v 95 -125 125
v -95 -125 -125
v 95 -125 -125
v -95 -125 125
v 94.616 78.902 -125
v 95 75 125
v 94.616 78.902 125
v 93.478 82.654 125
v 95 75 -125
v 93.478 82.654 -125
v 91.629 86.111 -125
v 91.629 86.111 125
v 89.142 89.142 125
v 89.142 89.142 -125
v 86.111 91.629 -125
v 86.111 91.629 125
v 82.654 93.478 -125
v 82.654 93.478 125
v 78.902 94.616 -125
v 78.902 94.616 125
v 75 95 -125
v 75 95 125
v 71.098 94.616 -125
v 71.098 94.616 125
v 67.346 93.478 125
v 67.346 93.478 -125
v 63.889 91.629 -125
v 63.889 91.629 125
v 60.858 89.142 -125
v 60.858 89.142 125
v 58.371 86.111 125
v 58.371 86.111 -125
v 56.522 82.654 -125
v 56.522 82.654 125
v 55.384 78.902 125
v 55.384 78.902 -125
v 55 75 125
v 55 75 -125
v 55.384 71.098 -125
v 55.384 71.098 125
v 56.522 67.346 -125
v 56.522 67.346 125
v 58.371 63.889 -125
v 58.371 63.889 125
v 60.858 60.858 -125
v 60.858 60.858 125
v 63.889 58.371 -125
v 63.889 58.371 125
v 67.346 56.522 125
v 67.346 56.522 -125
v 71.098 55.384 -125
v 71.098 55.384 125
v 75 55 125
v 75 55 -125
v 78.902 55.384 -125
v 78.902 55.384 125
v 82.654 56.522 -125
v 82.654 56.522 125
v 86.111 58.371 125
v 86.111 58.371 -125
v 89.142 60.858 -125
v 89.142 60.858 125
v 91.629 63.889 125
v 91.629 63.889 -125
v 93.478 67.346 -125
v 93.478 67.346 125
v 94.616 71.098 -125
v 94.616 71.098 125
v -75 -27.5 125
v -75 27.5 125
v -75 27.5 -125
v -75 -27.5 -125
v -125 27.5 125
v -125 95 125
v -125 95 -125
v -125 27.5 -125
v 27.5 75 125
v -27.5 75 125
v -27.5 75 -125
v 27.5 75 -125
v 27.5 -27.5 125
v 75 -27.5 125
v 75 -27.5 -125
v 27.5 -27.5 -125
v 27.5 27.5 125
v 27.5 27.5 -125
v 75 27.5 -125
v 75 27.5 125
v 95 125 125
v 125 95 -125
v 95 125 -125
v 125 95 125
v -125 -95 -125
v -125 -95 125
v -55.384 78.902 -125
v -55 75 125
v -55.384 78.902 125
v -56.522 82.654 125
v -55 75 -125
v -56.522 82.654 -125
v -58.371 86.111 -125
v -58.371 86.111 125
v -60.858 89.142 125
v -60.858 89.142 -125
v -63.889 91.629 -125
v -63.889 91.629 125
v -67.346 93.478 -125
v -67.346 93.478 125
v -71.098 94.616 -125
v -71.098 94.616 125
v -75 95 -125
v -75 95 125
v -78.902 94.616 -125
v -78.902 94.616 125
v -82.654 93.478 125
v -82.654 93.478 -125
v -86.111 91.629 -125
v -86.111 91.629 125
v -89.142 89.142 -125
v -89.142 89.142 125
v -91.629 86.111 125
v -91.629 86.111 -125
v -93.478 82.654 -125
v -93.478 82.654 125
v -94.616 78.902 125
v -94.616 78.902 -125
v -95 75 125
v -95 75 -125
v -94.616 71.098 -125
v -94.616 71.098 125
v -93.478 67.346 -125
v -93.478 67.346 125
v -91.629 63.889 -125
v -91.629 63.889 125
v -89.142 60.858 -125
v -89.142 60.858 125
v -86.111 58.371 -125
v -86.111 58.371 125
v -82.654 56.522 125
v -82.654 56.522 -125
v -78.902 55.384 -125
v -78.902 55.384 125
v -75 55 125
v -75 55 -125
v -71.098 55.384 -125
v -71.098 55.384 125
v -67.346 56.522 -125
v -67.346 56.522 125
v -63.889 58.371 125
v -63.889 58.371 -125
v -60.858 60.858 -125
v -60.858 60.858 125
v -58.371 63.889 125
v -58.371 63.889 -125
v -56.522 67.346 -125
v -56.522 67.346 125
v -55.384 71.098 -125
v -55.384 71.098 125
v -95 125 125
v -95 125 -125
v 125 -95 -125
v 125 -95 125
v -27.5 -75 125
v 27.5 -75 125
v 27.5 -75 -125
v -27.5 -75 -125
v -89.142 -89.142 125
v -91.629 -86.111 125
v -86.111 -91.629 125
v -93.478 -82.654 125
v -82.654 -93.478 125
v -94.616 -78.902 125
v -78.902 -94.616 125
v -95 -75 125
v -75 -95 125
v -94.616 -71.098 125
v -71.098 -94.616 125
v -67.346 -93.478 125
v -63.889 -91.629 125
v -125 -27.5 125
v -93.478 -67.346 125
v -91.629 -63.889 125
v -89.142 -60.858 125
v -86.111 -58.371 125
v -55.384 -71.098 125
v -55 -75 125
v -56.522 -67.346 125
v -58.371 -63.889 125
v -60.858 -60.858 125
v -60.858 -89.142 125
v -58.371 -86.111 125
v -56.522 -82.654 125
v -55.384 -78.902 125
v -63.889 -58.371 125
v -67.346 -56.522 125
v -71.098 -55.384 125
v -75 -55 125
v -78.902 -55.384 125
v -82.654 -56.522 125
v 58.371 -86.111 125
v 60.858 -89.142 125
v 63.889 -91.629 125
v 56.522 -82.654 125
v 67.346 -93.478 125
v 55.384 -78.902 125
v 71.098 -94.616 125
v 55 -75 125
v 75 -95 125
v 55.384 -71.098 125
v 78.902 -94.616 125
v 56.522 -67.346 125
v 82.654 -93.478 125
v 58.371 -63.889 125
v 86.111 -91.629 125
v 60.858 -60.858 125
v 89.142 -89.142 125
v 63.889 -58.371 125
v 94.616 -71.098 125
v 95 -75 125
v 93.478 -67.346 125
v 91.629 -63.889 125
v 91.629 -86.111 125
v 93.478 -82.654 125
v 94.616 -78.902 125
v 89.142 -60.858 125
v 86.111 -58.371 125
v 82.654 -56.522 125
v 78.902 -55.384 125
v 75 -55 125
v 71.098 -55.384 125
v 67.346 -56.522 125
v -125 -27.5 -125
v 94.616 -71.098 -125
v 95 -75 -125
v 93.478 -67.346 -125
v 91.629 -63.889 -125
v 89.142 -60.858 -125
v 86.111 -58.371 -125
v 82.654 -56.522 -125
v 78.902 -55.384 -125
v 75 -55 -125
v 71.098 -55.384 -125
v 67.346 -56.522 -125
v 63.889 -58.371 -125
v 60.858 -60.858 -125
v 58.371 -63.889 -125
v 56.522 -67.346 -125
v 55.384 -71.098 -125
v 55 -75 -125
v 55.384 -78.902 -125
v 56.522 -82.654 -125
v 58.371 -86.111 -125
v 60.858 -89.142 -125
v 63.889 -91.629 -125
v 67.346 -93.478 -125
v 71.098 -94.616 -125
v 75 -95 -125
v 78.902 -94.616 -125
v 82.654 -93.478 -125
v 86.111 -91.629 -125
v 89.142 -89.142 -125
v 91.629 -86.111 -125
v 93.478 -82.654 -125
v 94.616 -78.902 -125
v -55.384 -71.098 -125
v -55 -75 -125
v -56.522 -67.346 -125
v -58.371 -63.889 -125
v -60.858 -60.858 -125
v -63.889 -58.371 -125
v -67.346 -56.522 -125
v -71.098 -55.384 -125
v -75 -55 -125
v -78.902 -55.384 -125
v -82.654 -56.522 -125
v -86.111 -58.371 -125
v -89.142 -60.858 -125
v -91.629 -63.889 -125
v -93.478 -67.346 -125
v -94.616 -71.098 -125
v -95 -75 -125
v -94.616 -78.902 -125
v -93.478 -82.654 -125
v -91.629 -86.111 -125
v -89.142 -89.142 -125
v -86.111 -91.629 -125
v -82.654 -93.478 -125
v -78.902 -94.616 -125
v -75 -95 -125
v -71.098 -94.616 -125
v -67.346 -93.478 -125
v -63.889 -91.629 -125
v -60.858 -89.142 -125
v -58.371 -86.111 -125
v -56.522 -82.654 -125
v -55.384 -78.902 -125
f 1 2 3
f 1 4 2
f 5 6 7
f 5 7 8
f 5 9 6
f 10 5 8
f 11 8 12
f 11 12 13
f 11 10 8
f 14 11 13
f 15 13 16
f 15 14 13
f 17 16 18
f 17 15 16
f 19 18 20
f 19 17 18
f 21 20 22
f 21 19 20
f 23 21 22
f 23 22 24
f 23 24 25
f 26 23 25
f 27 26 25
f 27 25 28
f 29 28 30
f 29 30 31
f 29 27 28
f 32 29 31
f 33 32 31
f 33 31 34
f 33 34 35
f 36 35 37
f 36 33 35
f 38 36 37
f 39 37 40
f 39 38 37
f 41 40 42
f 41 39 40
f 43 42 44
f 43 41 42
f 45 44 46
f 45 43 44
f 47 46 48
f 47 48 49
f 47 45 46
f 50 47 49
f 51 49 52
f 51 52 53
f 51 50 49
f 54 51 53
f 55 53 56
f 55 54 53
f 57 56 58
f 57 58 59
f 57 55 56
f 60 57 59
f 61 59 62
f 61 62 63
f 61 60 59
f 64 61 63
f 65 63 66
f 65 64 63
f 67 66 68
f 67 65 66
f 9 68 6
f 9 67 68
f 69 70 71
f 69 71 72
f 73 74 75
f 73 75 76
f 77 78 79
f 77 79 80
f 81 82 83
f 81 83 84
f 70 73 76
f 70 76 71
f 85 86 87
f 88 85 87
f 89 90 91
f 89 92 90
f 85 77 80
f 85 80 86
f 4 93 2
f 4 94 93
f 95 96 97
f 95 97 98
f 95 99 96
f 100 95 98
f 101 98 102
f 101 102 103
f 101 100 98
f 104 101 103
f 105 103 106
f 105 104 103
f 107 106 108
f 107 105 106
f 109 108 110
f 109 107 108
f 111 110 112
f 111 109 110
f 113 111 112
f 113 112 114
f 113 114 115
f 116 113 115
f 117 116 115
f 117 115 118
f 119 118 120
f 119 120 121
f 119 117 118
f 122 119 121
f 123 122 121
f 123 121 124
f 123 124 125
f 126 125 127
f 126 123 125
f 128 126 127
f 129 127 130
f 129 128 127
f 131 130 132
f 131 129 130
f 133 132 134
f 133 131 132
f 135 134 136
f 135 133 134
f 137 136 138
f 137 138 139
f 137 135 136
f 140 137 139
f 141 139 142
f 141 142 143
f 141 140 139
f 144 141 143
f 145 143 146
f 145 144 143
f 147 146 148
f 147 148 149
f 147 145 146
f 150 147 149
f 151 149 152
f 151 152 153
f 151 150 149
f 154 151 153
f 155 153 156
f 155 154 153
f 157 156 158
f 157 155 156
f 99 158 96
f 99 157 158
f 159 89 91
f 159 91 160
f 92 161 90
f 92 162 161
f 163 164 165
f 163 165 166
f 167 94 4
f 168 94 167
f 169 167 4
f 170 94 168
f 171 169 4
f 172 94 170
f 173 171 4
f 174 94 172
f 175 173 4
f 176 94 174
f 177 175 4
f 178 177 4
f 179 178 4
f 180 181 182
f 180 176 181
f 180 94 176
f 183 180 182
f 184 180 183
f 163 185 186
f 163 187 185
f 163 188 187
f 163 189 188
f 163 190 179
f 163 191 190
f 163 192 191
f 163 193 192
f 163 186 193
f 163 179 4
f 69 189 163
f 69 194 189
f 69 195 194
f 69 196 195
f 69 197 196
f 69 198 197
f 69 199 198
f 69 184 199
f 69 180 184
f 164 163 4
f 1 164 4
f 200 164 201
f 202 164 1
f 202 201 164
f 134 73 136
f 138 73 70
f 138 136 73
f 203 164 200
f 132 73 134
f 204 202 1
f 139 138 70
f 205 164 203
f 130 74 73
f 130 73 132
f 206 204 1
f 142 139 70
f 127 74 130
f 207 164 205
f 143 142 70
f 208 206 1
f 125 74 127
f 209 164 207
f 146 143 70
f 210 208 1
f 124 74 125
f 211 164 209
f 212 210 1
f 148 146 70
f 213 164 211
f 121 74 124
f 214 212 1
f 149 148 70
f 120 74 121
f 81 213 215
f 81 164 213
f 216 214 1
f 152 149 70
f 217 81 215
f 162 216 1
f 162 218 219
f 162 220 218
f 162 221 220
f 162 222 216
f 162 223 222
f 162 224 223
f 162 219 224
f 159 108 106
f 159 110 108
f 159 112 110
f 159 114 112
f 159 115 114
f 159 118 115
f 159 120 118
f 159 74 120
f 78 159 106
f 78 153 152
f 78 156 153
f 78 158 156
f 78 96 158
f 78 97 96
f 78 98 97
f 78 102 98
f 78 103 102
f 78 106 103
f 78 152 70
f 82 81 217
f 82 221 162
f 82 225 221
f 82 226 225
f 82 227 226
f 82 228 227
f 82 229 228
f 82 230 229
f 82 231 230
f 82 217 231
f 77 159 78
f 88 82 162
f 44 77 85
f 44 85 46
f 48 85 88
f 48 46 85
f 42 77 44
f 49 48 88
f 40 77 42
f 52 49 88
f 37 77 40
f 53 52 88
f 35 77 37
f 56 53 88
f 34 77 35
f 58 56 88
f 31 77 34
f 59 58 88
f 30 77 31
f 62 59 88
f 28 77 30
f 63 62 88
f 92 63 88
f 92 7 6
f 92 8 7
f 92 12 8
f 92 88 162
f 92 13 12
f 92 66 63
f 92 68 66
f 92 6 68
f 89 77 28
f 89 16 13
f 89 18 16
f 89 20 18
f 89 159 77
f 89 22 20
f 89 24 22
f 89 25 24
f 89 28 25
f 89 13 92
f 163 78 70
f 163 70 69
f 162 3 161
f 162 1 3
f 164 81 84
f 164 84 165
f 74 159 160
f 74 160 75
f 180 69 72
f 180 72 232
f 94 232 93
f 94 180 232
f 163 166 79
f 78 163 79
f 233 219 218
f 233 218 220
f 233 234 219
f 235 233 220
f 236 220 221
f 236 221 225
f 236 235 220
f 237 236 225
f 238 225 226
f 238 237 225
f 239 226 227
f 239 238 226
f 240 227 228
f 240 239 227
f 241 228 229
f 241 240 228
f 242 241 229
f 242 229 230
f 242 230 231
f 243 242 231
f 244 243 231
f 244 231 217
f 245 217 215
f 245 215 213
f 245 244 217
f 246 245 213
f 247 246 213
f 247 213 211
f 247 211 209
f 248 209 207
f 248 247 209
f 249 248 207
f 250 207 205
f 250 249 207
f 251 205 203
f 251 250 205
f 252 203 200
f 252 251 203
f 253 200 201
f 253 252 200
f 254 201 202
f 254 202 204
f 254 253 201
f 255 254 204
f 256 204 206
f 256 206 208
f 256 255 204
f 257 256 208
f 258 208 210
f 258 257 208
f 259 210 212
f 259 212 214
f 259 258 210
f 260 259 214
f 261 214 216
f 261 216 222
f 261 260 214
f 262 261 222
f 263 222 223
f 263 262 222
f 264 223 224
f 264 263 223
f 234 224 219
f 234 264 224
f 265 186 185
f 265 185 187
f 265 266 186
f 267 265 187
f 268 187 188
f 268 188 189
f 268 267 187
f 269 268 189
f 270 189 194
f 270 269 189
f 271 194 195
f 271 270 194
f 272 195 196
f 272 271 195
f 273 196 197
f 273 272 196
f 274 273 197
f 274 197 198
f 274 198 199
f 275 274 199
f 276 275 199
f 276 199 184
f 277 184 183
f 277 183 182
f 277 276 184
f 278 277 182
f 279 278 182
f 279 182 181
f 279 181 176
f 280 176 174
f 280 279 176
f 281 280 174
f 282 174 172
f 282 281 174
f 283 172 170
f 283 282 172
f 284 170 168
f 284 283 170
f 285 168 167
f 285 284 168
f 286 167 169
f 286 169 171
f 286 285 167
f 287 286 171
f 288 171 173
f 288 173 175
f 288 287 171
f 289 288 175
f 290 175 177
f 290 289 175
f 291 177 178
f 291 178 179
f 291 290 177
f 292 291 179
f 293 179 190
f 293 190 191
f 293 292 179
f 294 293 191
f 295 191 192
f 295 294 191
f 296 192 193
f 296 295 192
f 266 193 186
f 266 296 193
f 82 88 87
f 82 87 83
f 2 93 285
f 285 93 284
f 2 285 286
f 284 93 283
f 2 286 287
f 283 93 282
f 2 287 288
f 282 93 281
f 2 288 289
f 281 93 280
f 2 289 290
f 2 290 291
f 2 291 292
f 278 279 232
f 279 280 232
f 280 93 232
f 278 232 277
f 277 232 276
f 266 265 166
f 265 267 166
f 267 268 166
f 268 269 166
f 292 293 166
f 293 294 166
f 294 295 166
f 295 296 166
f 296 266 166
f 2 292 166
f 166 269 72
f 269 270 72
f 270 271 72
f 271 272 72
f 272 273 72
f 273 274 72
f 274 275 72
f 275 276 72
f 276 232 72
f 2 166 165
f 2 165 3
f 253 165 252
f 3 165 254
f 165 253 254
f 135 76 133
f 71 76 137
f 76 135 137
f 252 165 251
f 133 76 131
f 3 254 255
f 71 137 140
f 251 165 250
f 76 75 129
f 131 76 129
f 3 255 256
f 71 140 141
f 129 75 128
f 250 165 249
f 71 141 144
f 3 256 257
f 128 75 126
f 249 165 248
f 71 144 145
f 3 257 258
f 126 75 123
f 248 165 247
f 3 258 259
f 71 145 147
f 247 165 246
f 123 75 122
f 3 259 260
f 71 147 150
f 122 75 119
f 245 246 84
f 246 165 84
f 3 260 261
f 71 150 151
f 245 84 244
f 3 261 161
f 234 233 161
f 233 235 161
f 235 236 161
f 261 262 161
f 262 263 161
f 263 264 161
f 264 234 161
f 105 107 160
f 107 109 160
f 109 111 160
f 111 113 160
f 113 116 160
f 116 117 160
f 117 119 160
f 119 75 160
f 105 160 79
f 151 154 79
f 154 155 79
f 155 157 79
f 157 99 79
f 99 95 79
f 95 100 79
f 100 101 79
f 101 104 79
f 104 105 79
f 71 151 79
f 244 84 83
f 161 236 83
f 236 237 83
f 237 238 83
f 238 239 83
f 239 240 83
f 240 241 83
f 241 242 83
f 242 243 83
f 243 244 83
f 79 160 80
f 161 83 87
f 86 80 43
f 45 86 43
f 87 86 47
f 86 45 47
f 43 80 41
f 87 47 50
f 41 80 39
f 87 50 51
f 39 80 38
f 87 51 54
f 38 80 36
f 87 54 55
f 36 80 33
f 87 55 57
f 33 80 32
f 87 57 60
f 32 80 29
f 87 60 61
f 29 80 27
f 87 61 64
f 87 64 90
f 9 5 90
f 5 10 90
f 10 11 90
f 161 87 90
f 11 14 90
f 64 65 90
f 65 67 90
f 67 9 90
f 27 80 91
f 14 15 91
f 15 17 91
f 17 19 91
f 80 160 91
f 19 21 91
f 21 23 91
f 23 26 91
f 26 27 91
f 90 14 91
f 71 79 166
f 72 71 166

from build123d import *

# Parameters (mm, degrees)
F0_R     = 20
F1_DEPTH = 125


with BuildPart() as f1:
    # F0 (on Top) → F1 (new body, symmetric)
    with BuildSketch(Plane.XY):
        Polygon((125, 95), (95, 125), (-95, 125), (-125, 95), (-125, 27.5), (-75, 27.5), (-75, -27.5), (-125, -27.5), (-125, -95), (-95, -125), (95, -125), (125, -95), align=None)
        with Locations((-75, -75)):
            Circle(F0_R, mode=Mode.SUBTRACT)
        with Locations((75, -75)):
            Circle(F0_R, mode=Mode.SUBTRACT)
        with Locations((-75, 75)):
            Circle(F0_R, mode=Mode.SUBTRACT)
        Polygon((-27.5, -75), (-27.5, 75), (27.5, 75), (27.5, 27.5), (75, 27.5), (75, -27.5), (27.5, -27.5), (27.5, -75), align=None, mode=Mode.SUBTRACT)
        with Locations((75, 75)):
            Circle(F0_R, mode=Mode.SUBTRACT)
    extrude(amount=F1_DEPTH, both=True)


solid = f1.part
